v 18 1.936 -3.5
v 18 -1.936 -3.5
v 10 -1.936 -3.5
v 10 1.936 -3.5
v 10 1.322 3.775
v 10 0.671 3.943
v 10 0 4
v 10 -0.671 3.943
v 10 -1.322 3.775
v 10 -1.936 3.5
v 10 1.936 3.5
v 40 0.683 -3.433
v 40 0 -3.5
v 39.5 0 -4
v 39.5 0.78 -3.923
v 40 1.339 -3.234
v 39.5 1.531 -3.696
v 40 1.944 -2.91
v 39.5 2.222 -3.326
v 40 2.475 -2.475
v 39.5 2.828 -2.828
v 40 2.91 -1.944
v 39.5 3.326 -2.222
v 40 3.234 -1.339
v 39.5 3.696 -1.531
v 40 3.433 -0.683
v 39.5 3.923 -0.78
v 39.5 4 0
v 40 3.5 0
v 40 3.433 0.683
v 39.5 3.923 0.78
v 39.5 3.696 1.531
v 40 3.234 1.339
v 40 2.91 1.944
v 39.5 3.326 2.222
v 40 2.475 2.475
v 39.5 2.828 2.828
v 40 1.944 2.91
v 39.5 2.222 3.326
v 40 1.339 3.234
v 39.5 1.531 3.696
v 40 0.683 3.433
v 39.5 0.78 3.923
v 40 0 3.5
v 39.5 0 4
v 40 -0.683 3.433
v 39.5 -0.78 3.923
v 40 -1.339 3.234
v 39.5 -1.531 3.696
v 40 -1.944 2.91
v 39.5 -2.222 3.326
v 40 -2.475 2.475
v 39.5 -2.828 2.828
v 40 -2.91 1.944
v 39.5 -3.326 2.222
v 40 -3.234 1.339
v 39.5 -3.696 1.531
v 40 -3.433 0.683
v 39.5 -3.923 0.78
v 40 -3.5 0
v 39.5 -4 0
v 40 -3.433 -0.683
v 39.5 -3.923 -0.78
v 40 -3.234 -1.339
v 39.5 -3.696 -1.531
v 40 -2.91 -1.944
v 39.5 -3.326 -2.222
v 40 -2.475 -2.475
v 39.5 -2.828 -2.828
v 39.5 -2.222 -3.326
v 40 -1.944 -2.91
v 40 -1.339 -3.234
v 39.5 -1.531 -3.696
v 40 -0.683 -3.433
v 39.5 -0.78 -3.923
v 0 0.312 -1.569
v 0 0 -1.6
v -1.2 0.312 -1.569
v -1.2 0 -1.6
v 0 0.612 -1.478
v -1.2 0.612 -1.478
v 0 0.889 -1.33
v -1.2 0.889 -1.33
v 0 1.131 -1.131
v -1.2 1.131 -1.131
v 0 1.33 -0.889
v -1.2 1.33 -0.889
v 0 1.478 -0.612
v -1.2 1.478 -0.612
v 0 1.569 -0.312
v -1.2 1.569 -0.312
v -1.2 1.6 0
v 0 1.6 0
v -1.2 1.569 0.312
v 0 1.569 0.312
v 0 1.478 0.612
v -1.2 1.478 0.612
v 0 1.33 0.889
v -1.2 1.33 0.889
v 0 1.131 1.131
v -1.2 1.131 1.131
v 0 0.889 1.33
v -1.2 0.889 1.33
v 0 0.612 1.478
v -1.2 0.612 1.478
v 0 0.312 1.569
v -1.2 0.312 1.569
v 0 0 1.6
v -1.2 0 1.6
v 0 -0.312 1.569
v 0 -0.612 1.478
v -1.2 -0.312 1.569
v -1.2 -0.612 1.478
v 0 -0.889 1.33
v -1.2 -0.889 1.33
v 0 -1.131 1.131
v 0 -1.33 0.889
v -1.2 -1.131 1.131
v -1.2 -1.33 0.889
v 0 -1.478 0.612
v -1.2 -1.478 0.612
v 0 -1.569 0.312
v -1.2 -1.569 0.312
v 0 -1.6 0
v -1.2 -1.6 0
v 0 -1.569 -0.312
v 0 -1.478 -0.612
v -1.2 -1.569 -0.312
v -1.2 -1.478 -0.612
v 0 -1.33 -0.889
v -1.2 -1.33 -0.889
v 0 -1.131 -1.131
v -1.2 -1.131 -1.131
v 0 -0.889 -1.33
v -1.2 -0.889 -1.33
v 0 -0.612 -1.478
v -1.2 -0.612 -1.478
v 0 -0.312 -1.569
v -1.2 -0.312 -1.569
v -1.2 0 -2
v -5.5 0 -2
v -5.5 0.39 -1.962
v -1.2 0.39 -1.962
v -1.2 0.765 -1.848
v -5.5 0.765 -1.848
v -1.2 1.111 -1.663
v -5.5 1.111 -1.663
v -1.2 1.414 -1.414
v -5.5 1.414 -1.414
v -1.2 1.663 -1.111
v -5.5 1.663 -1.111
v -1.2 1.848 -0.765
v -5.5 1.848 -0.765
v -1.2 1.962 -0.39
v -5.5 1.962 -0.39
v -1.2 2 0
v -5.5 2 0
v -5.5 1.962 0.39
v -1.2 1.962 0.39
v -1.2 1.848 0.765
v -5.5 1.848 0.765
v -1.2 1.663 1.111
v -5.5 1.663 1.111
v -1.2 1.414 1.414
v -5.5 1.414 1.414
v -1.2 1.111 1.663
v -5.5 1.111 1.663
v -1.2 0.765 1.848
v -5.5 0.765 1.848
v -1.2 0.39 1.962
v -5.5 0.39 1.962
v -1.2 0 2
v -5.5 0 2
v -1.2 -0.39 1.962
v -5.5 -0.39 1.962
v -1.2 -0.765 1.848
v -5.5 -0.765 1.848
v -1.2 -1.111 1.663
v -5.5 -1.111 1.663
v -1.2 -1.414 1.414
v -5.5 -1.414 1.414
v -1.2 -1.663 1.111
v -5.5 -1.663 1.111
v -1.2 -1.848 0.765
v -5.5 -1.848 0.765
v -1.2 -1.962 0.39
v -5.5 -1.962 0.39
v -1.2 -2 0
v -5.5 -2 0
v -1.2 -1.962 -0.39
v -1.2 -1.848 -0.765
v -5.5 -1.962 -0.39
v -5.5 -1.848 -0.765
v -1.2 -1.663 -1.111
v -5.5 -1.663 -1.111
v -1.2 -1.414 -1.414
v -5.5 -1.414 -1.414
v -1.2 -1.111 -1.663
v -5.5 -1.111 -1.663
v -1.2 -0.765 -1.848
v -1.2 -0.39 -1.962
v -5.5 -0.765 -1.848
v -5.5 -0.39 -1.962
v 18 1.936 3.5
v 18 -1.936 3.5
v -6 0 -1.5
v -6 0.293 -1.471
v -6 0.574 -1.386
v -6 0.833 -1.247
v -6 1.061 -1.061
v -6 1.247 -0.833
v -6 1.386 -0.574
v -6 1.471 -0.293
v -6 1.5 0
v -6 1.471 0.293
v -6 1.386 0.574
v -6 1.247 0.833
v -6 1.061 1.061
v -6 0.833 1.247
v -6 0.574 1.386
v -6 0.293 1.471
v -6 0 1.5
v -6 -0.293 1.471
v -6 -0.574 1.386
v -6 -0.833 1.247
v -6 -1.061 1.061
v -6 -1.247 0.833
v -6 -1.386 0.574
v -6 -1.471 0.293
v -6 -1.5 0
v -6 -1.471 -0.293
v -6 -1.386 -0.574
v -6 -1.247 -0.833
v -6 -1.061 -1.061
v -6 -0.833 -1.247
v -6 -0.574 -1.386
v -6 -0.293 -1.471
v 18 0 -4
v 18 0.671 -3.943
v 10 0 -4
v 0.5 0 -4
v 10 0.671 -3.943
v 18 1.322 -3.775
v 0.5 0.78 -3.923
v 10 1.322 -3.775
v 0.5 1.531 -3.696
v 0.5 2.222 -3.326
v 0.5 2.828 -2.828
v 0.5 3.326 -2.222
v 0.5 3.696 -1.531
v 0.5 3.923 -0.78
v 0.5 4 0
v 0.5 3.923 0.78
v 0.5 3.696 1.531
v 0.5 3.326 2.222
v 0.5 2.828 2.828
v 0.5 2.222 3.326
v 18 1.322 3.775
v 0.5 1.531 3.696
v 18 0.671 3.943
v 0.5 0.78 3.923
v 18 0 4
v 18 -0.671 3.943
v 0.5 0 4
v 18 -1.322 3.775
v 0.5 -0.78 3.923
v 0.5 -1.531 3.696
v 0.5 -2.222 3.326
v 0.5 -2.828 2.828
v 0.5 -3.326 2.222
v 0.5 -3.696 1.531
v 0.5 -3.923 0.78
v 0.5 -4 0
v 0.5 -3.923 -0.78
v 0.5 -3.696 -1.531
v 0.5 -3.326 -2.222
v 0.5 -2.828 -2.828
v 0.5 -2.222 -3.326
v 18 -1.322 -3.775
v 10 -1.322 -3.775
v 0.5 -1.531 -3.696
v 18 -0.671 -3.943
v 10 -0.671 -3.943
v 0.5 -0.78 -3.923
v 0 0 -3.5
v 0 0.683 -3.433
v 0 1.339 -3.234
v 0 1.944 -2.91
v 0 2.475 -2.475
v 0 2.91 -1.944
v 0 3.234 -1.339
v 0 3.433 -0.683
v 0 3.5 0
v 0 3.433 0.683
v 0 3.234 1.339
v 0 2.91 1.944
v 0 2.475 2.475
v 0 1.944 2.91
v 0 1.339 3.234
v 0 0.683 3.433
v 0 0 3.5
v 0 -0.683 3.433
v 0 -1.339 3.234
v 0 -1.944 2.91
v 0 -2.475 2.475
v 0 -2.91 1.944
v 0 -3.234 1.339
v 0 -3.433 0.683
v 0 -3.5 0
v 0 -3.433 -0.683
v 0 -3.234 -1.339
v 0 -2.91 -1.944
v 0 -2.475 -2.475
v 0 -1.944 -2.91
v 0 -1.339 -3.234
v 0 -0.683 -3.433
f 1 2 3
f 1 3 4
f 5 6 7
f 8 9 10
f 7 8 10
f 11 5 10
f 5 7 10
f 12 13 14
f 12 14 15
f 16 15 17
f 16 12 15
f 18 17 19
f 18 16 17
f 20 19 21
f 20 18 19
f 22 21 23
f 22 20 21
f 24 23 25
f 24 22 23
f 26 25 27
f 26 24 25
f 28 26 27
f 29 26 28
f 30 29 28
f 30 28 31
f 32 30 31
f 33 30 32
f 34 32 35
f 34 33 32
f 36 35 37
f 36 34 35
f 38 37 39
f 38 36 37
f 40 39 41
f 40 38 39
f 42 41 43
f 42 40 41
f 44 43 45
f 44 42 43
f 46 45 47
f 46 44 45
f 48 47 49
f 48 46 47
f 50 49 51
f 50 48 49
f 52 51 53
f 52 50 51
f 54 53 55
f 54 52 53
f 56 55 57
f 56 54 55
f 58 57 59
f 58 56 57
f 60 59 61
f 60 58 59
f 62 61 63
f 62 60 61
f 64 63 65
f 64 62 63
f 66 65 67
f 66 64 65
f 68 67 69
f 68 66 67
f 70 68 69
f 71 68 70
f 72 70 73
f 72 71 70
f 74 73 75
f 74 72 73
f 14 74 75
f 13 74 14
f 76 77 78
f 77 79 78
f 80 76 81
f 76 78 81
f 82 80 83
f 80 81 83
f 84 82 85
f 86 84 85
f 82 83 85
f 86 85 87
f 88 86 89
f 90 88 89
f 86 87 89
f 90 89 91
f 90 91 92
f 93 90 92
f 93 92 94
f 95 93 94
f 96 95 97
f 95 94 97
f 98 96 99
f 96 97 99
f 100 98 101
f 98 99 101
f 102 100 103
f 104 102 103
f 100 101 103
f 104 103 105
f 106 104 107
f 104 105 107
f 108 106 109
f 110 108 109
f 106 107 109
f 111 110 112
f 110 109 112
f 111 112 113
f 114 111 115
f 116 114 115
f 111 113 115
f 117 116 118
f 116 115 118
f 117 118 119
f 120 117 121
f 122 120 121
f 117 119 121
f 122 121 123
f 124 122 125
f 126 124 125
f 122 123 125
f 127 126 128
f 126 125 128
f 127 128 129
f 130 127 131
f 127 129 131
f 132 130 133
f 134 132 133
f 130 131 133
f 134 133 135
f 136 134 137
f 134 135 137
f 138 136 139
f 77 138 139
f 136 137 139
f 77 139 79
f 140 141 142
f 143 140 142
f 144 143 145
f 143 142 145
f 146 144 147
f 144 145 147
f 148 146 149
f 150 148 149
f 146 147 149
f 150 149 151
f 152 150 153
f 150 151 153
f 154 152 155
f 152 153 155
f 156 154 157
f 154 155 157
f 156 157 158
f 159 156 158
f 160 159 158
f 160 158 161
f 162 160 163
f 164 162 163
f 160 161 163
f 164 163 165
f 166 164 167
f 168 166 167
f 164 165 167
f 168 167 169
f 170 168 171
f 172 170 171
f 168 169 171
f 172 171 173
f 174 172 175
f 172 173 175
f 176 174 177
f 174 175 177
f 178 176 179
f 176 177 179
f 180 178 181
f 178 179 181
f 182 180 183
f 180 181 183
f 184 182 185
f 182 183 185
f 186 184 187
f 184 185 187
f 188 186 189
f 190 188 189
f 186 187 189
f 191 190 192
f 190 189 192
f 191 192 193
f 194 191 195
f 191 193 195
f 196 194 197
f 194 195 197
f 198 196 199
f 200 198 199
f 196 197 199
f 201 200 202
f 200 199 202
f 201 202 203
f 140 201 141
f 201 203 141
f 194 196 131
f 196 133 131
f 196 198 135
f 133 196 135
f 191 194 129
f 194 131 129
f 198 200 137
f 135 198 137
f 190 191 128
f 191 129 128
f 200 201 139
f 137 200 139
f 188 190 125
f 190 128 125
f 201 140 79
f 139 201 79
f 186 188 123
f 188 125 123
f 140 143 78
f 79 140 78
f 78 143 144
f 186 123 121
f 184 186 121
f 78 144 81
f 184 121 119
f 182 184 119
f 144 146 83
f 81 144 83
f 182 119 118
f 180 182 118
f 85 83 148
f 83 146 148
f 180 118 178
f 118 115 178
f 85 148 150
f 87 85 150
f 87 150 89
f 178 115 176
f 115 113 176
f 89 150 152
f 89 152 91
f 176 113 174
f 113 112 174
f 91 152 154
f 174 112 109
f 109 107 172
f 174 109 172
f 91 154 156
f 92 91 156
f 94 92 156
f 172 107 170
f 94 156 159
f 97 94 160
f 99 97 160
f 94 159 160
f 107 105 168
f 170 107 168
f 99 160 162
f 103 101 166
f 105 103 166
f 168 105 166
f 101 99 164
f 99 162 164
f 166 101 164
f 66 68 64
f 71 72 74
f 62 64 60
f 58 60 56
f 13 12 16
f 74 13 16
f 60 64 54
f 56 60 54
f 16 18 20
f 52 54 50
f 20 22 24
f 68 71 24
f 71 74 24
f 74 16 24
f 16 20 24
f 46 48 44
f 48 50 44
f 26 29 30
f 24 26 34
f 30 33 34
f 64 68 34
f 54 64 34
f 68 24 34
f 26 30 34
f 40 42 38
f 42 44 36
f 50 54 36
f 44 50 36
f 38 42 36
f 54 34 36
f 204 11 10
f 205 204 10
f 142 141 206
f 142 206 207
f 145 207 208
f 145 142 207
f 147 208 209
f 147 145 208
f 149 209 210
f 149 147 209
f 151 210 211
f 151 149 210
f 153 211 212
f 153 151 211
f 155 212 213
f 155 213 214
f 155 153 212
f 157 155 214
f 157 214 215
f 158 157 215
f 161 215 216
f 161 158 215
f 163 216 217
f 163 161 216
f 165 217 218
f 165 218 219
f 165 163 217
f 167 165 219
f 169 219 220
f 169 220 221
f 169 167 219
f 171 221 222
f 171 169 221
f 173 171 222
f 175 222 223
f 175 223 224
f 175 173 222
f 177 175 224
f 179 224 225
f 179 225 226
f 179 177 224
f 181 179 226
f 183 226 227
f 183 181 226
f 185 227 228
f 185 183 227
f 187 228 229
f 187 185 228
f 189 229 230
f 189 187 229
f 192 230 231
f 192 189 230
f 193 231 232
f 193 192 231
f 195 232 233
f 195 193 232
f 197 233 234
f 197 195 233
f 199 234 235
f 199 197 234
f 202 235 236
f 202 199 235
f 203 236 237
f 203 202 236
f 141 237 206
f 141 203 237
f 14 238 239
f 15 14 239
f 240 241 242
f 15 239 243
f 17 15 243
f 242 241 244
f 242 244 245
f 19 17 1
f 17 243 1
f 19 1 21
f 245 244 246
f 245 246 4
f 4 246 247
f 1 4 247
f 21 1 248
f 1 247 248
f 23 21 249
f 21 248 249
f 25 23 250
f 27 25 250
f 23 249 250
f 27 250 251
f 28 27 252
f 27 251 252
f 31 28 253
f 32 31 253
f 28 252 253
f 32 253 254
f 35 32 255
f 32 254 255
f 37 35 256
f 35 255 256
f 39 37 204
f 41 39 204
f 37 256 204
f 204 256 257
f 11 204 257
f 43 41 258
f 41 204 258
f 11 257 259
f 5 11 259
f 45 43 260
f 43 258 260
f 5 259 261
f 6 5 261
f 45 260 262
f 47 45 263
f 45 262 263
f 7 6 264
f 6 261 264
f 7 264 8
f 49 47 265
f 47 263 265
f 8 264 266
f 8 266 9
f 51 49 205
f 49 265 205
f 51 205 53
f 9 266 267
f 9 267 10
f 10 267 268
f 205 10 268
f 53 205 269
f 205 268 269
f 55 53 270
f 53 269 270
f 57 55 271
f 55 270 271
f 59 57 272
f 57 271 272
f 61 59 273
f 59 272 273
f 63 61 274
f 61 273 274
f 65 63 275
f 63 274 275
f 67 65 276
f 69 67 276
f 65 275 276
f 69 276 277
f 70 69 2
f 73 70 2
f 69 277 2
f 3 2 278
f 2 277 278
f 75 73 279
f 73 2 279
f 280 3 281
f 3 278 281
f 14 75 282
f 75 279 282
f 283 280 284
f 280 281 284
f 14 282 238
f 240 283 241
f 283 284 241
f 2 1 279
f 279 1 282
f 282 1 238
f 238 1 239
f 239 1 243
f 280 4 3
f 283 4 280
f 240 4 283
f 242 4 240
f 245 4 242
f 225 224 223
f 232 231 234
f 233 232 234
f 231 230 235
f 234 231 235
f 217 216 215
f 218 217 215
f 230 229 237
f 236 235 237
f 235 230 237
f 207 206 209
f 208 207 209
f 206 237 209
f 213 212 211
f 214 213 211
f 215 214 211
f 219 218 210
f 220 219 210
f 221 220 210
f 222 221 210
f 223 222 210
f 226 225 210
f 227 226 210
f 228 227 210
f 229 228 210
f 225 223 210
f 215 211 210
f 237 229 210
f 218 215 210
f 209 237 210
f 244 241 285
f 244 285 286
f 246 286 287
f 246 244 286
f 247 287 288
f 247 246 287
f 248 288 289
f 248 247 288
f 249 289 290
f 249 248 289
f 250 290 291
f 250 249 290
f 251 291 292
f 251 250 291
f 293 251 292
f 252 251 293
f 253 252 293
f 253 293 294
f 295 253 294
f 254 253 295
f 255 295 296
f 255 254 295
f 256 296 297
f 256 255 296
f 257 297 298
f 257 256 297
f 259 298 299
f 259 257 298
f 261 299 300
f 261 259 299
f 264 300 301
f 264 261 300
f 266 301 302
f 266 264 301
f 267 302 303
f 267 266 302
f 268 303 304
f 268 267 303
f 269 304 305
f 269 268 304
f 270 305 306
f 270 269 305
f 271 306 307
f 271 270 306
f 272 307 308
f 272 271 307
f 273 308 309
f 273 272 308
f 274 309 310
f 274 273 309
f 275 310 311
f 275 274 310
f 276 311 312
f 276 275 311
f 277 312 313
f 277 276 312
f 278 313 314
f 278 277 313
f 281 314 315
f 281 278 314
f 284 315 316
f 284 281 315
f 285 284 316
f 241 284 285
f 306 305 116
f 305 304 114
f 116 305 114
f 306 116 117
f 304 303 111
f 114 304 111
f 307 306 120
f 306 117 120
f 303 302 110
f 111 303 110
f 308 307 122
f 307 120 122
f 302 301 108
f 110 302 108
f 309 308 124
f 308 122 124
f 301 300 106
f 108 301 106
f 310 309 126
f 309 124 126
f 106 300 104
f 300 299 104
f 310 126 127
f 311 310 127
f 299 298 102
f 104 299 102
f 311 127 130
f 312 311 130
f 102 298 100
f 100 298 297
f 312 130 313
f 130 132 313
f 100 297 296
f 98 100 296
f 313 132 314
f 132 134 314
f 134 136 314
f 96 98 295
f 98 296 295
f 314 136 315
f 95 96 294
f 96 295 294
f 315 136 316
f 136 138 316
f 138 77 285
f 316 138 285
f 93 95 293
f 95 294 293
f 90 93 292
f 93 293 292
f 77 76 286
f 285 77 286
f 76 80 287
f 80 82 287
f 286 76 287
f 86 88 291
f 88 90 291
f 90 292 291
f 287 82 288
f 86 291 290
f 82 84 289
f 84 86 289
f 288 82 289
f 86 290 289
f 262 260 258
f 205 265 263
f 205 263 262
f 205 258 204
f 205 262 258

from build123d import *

# Parameters (mm, degrees)
CUT_EXTRUDE1_DEPTH = 8
CUT_EXTRUDE2_DEPTH = 8
CHAMFER1_SIZE      = 0.5


with BuildPart() as part:
    # Sketch1 → Revolve1 (revolve)
    with BuildSketch(Plane.XY):
        Polygon((-6, 2), (-6, 0), (40, 0), (40, 4), (0, 4), (0, 1.6), (-1.2, 1.6), (-1.2, 2), align=None)
    revolve(axis=Axis((-6, 0, 0), (1, 0, 0)))

    # Sketch2 → Cut-Extrude1 (cut)
    with BuildSketch(Plane(origin=(10, 0, 0), x_dir=(0, -1, 0), z_dir=(-1, 0, 0))):
        with BuildLine():
            Line((1.936491673, -3.5), (-1.936491673, -3.5))
            ThreePointArc((-1.936491673, -3.5), (0, -4), (1.936491673, -3.5))
        make_face()
    extrude(amount=-CUT_EXTRUDE1_DEPTH, mode=Mode.SUBTRACT)

    # Sketch3 → Cut-Extrude2 (cut)
    with BuildSketch(Plane(origin=(10, 0, 0), x_dir=(0, -1, 0), z_dir=(-1, 0, 0))):
        with BuildLine():
            Line((-1.936491622, 3.500000028), (1.936491622, 3.500000028))
            ThreePointArc((1.936491622, 3.500000028), (0, 4), (-1.936491622, 3.500000028))
        make_face()
    extrude(amount=-CUT_EXTRUDE2_DEPTH, mode=Mode.SUBTRACT)

    # Chamfer1
    chamfer1_edges = [part.edges().sort_by_distance(p)[0] for p in [
        (-6, -2, 0),
        (40, -4, 0),
        (0, -4, 0),
    ]]
    chamfer(chamfer1_edges, length=CHAMFER1_SIZE)


solid = part.part
